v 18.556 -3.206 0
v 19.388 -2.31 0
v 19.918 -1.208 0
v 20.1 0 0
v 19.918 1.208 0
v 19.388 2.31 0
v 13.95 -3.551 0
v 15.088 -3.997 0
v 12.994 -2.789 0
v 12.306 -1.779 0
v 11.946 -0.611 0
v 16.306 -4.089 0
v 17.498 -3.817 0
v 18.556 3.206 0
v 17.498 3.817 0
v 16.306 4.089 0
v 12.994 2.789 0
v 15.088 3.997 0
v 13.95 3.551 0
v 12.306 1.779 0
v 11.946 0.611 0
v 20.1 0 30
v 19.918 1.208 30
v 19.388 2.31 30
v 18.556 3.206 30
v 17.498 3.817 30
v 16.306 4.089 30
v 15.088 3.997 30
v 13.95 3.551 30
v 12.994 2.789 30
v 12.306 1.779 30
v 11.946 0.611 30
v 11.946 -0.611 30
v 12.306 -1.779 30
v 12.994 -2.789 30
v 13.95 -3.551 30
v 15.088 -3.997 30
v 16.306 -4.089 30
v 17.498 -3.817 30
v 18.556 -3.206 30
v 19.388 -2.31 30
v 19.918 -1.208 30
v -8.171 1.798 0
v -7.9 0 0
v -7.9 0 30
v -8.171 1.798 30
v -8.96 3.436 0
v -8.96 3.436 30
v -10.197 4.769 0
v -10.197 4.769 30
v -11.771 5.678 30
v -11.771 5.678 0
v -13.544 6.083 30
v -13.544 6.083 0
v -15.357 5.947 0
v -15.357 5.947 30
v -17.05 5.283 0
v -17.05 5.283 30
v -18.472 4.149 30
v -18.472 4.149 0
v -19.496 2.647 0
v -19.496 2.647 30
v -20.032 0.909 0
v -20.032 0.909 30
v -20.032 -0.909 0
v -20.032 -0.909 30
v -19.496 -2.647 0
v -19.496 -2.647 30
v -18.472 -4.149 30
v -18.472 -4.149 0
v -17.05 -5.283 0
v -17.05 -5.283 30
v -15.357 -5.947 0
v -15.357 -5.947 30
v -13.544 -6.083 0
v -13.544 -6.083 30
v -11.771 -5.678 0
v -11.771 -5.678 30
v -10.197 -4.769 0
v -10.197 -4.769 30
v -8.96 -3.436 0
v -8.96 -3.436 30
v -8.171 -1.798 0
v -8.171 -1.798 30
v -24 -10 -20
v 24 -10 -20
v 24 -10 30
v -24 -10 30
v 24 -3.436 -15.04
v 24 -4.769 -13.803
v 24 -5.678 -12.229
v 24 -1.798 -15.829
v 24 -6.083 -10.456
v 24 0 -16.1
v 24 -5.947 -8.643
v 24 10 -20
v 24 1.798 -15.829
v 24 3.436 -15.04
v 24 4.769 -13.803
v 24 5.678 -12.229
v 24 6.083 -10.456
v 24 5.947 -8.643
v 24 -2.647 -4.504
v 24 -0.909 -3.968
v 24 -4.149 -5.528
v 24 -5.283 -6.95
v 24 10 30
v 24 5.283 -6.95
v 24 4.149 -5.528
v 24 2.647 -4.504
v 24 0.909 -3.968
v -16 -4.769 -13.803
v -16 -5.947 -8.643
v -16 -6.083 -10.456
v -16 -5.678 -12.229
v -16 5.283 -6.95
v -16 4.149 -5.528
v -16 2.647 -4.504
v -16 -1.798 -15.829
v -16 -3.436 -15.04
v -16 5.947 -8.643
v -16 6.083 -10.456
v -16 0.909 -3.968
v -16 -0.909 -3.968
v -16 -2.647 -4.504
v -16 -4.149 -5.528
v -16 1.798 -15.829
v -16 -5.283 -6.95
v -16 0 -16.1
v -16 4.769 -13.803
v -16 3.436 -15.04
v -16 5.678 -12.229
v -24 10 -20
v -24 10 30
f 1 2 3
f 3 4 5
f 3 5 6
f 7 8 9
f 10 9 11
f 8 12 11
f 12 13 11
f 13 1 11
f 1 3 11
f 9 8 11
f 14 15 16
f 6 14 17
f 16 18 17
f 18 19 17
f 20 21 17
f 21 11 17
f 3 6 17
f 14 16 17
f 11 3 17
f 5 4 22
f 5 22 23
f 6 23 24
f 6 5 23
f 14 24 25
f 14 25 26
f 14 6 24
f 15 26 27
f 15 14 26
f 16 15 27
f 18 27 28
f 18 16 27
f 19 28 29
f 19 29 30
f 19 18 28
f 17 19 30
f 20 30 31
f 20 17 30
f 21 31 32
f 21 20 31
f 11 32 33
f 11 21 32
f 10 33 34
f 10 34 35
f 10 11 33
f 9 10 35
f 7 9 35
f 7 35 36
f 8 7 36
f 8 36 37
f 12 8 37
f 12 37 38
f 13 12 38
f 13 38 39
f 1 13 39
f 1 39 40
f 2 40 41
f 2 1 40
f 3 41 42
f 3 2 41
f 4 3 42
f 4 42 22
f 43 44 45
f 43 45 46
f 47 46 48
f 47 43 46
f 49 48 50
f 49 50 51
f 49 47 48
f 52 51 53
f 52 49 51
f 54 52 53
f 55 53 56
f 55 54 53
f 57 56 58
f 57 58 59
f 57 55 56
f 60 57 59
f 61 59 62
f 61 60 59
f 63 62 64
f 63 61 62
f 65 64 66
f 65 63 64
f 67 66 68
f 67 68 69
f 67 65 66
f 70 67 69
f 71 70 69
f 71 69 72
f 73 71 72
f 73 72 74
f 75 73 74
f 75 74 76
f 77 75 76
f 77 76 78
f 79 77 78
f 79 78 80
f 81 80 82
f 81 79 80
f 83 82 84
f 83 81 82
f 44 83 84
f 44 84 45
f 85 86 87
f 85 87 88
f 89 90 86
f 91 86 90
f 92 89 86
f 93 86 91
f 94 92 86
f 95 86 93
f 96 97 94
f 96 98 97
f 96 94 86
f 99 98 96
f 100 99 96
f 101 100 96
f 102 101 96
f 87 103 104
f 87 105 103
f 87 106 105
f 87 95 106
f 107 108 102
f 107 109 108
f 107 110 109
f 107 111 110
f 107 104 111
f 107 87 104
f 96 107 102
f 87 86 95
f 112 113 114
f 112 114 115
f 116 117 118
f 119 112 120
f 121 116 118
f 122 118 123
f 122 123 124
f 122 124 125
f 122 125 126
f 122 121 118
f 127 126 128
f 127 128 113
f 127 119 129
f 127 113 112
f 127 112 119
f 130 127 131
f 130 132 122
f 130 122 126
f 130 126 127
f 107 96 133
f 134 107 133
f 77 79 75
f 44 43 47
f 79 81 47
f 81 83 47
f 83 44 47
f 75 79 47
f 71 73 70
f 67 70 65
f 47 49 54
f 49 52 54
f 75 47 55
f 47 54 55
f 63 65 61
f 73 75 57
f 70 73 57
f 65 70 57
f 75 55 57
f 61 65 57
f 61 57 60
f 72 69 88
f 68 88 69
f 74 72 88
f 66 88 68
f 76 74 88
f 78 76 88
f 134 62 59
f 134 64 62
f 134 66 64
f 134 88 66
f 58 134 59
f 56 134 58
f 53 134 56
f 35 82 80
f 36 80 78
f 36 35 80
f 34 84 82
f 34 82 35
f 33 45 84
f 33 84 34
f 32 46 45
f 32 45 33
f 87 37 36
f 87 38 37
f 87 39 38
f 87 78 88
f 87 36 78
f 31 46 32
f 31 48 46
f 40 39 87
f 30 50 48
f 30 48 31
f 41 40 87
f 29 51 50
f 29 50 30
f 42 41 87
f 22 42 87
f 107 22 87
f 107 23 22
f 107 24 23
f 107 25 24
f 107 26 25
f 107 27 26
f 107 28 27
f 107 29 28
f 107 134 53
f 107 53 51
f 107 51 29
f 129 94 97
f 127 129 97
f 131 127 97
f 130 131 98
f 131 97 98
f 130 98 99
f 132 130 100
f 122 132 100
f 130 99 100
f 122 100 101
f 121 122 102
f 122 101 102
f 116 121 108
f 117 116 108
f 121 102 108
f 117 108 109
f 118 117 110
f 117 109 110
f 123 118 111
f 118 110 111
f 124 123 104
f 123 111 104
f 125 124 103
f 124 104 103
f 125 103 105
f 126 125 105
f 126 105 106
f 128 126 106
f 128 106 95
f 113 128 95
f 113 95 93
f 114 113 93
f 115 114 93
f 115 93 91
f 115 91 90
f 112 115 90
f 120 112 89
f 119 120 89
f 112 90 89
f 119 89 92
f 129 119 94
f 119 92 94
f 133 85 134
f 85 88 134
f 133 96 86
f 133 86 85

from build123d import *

# Parameters (mm, degrees)
SKETCH1_W           = 48
SKETCH1_H           = 20
SKETCH1_R           = 6.1
SKETCH1_R_2         = 4.1
BOSS_EXTRUDE1_DEPTH = 30
SKETCH2_W           = 48
SKETCH2_H           = 20
BOSS_EXTRUDE2_DEPTH = 20
SKETCH3_R           = 6.1
CUT_EXTRUDE1_DEPTH  = 40


with BuildPart() as part:
    # Sketch1 → Boss-Extrude1 (new body)
    with BuildSketch(Plane.XY):
        Rectangle(SKETCH1_W, SKETCH1_H)
        with Locations((-14, 0)):
            Circle(SKETCH1_R, mode=Mode.SUBTRACT)
        with Locations((16, 0)):
            Circle(SKETCH1_R_2, mode=Mode.SUBTRACT)
    extrude(amount=BOSS_EXTRUDE1_DEPTH)

    # Sketch2 → Boss-Extrude2 (add)
    with BuildSketch(Plane(origin=(0, 0, 0), x_dir=(-1, 0, 0), z_dir=(0, 0, -1))):
        Rectangle(SKETCH2_W, SKETCH2_H)
    extrude(amount=BOSS_EXTRUDE2_DEPTH)

    # Sketch3 → Cut-Extrude1 (cut)
    with BuildSketch(Plane(origin=(24, 0, 0), x_dir=(0, 0, -1), z_dir=(1, 0, 0))):
        with Locations((10, 0)):
            Circle(SKETCH3_R)
    extrude(amount=-CUT_EXTRUDE1_DEPTH, mode=Mode.SUBTRACT)


solid = part.part
